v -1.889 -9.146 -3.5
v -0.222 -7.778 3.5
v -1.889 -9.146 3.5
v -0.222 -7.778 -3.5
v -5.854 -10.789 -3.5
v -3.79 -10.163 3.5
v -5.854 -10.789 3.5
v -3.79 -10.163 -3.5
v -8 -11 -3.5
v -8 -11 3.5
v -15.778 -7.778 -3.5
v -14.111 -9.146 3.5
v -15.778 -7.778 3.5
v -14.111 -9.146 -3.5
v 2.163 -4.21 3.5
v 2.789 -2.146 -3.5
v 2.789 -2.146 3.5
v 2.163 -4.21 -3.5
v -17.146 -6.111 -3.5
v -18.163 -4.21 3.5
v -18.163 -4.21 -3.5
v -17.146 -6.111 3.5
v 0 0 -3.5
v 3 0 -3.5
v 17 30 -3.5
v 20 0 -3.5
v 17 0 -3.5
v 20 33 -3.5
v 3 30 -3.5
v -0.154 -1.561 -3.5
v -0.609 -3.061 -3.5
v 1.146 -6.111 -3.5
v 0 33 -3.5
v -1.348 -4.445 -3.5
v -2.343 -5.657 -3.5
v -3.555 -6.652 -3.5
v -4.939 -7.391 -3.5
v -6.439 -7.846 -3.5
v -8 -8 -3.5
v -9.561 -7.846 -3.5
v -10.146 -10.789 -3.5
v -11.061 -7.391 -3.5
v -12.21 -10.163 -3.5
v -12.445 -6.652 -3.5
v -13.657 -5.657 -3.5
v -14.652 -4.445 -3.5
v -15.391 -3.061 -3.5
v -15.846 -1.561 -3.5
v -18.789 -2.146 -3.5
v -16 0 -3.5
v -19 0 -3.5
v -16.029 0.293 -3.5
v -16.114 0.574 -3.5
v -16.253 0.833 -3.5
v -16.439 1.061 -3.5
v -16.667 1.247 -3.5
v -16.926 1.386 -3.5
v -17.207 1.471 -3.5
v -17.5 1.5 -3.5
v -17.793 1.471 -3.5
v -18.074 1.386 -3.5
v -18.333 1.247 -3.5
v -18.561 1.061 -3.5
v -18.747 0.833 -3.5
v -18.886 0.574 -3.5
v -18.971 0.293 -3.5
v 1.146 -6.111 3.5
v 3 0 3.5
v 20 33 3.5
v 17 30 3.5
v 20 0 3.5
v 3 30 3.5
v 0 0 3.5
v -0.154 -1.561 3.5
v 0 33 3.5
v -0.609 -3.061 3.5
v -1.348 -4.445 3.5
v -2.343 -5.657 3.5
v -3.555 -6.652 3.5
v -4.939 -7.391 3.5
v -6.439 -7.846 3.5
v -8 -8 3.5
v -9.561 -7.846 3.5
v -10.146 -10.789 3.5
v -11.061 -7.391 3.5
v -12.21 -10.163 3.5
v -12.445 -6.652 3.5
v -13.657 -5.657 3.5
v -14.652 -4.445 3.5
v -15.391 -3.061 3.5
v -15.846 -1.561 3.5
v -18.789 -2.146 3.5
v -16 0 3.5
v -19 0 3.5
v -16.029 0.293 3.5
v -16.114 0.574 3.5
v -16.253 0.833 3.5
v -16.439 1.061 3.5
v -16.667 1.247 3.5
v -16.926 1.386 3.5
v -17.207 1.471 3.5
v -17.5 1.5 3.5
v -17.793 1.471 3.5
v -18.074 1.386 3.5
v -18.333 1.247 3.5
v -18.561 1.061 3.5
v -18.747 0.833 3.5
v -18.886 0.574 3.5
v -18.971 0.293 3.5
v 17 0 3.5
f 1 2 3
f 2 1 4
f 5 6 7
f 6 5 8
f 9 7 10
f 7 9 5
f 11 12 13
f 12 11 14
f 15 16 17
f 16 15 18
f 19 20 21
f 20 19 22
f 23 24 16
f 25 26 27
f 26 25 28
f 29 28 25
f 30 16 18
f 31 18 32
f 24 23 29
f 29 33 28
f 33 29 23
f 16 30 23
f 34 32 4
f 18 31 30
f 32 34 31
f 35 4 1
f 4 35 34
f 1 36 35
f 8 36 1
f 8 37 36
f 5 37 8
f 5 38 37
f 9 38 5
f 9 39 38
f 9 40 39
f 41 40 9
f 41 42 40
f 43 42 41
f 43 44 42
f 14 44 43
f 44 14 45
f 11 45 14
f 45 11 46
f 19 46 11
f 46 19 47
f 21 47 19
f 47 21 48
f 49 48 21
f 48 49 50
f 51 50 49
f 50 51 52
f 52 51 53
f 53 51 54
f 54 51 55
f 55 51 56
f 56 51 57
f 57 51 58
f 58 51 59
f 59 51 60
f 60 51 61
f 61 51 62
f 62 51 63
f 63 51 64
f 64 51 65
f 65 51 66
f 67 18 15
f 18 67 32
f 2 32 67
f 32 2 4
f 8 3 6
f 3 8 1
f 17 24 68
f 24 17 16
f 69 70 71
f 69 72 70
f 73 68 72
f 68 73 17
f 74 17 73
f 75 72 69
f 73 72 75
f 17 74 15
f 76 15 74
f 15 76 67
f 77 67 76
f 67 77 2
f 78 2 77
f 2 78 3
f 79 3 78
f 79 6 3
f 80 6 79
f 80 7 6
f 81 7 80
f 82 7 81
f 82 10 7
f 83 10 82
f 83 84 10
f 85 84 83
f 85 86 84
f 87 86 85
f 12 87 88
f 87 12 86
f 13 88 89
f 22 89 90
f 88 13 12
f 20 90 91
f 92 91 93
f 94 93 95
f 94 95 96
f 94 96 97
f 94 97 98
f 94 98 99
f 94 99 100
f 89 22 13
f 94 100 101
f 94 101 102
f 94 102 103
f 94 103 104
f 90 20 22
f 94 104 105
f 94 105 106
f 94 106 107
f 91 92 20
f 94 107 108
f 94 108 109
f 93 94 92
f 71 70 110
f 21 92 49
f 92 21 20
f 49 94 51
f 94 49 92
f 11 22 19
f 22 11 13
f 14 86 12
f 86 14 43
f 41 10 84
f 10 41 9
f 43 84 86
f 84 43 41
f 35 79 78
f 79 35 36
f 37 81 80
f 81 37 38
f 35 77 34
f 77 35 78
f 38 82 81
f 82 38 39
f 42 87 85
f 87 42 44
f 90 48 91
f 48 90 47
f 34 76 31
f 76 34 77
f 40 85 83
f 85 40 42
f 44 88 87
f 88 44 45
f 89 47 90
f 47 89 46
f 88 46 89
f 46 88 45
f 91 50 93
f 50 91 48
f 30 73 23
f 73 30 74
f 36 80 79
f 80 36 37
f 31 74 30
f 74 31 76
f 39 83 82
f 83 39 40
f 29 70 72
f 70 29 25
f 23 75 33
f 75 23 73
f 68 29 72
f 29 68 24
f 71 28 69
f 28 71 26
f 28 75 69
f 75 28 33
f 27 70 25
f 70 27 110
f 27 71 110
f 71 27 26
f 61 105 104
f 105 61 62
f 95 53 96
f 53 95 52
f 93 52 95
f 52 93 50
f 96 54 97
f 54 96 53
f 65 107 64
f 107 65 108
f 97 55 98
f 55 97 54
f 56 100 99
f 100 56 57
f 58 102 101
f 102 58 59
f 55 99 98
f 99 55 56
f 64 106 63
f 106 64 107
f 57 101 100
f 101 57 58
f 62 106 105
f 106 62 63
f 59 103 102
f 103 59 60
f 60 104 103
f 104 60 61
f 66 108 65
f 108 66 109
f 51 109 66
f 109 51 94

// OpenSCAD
//use <tyler.scad>;

$fn=32*1;

E=0.05*1;

// Thickness of the part that goes over whatever you're hanging it on. (mm)
lip_thickness = 7;

// Thickness of the hook part. (mm)
hook_thickness = 7;

// Width of the hook; also basically sets its strength. (mm)
width = 3; 

// Height of the stem, i.e. the vertical part on the hook side. (mm)
stem_height = 30;

// How large is the actual hook part, measured as the diameter of the inside of the hook. (mm)
hook_diameter = 16; 

// How thick is the thing you're hanging the hook on? (mm)
lip_length = 14; 

// Height of the back part of the hook. (mm)
lip_height = 30;

hook_radius = hook_diameter/2;

//stem
cube2([width,stem_height+width,hook_thickness],aligns="LLC");

// hook
translate([-hook_radius,0,0]) {
    difference() {
        cylinder(r=hook_radius+width,h=hook_thickness,center=true);
        cylinder(r=hook_radius,h=hook_thickness+2*E,center=true);
        cube2([hook_diameter+2*width+E,hook_radius+width+E,hook_thickness+2*E],aligns="CLC");
    }
}
// rounded hook end
translate([-hook_diameter-width/2,0,0]) cylinder(d=width, h=hook_thickness, center=true); 


// lip
translate([0,stem_height,0]) {
    rotate([0,90,0]) linear_extrude(width) arc(r=lip_thickness/2, a1=180, a2=0);
    
    translate([0,width,0]) cube2([lip_length+width+width,width,lip_thickness],aligns="LRC");
    
    translate([lip_length+width,width,0]) cube2([width,lip_height+width,lip_thickness],aligns="LRC");
    
}


module cube2(size,aligns="LLL",radius=0,xy_radius=0) {
    real_size = len(size) ? size : [size,size,size];
    tr = [
        aligns[0]=="C" ? 0 : aligns[0]=="R" ? (-real_size[0]/2) : (+real_size[0]/2),
        aligns[1]=="C" ? 0 : aligns[1]=="R" ? (-real_size[1]/2) : (+real_size[1]/2),
        aligns[2]=="C" ? 0 : aligns[2]=="R" ? (-real_size[2]/2) : (+real_size[2]/2)
    ];
    translate(tr) {
        if (xy_radius>0) {
            inner_size = [for (v=real_size) v-min(xy_radius*2,v)];
            linear_extrude(real_size[2], center=true) offset(r=xy_radius) square([inner_size[0],inner_size[1]], center=true);
        } else if (radius>0) {
            if (radius*2 >= max(real_size)) {
                resize(real_size) sphere(1);
            } else {
                inner_size = [for (v=real_size) v-min(radius*2,v)];
                minkowski() {
                    cube(inner_size,center=true);
                    sphere(r=radius);
                }
            }
        } else {
            cube(real_size,center=true);
        }
    } 
}

module arc(r,a1,a2,ir=0) {
    // normalize to 0..360 (even for negatives)
    a1n = (a1 % 360 + 360) % 360; 
    a2n = (a2 % 360 + 360) % 360;
    difference() {
        circle(r);
        if (ir != 0) circle(ir); // if inner radius given, subtract it away
            
        // get the a1 to interpolate to, adding a revolution if going the long way
        a1next = a2n>a1n ? a1n + 360 : a1n; 
        
        polygon([
            [0,0],
            [cos(1.00*a2n + 0.00*a1next)*2*r,sin(1.00*a2n + 0.00*a1next)*2*r],
            [cos(0.66*a2n + 0.33*a1next)*2*r,sin(0.66*a2n + 0.33*a1next)*2*r],
            [cos(0.33*a2n + 0.66*a1next)*2*r,sin(0.33*a2n + 0.66*a1next)*2*r],
            [cos(0.00*a2n + 1.00*a1next)*2*r,sin(0.00*a2n + 1.00*a1next)*2*r],
        ]);
    }
}
